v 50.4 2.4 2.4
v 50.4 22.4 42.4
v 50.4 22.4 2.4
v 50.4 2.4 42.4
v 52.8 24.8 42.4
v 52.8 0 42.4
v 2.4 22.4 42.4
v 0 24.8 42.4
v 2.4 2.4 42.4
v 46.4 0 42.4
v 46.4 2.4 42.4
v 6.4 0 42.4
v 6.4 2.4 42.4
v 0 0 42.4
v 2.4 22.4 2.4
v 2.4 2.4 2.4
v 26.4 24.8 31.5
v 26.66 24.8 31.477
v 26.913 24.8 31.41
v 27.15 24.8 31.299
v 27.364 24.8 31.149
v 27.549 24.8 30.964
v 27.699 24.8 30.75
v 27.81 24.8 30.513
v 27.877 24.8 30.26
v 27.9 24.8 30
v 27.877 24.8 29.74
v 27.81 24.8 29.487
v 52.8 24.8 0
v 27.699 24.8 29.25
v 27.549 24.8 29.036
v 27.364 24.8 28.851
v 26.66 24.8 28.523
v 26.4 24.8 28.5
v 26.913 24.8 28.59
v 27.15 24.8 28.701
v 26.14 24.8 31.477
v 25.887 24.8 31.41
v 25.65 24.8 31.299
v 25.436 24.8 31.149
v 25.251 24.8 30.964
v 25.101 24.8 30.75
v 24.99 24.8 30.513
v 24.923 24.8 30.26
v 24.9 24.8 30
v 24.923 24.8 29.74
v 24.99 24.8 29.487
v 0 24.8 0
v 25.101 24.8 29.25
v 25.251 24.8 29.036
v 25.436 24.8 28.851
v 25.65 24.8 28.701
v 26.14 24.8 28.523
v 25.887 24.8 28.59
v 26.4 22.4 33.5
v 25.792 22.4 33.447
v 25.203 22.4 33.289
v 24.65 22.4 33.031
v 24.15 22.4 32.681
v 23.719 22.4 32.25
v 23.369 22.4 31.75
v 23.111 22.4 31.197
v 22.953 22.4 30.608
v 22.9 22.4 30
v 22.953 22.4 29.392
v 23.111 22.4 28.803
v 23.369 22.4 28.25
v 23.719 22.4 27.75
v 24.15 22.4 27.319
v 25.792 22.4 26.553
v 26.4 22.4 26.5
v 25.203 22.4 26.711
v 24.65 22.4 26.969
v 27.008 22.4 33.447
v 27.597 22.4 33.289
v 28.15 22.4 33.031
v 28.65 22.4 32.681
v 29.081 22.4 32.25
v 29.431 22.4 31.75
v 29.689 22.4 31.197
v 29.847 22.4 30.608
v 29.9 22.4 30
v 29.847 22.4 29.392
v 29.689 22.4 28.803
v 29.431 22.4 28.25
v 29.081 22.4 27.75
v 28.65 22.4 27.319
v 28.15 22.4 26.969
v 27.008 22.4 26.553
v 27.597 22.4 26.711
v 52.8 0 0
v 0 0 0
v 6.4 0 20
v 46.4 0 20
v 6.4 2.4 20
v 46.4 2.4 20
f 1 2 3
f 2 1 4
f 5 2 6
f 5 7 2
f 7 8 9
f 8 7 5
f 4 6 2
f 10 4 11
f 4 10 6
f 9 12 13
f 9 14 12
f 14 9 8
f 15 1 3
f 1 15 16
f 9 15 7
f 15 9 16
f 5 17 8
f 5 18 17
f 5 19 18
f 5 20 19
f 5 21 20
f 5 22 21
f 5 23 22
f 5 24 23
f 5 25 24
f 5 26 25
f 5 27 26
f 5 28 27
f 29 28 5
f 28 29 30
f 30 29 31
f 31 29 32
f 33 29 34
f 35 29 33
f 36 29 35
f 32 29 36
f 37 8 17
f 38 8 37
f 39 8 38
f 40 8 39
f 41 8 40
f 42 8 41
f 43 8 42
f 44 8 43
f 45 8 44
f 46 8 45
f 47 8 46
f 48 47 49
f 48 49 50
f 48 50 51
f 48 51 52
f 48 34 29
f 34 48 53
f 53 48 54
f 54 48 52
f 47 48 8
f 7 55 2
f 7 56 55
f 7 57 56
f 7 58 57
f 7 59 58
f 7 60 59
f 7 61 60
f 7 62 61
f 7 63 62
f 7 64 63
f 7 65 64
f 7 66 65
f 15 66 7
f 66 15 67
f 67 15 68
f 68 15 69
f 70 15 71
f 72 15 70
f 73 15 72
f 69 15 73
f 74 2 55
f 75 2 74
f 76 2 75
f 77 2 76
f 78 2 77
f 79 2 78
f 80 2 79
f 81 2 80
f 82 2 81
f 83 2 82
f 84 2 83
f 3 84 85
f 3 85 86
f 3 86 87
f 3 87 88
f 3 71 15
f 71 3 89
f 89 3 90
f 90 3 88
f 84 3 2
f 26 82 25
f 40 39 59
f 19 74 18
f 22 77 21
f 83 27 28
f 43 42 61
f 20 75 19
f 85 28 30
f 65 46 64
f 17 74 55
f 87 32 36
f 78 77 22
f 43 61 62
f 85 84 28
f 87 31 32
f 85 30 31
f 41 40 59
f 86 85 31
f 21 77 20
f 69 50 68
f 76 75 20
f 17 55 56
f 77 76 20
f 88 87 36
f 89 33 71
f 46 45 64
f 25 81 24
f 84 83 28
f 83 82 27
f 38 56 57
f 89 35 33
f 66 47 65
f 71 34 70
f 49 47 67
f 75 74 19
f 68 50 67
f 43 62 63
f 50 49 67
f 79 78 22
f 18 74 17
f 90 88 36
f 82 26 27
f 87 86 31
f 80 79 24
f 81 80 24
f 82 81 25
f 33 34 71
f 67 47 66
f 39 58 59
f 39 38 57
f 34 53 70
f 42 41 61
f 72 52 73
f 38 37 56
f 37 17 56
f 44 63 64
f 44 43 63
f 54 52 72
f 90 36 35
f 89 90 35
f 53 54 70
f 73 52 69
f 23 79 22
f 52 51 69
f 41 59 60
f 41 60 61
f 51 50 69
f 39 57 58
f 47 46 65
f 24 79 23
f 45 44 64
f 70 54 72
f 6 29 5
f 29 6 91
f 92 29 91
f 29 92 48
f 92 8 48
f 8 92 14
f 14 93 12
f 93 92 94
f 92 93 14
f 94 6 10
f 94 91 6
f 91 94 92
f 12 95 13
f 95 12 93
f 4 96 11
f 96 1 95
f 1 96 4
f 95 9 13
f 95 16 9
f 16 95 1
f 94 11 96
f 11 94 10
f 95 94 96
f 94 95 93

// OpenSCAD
//x10
$fn=36;
h=40;//80 height until end of battery holder, but we only use the half
th=h+106;//total height of remote
w=48;//47 breit, mit Toleranz
d=20;//depth without keys 19, with keys 22 => 20 mit Toleranz
lb=4;//left border until keys
bb=20;//bottom border until keys
t=2.4;

//bottom plate
cube([2*t+w,2*t+d,t]);

//Left side
translate([0,0,t])
cube([t,2*t+d,h]);

//Right side
translate([t+w,0,t])
cube([t,2*t+d,h]);


//Front left
translate([t, 0, t])
cube([lb,t,h]);

//Front right
translate([w-lb+t, 0, t])
cube([lb,t,h]);

//Front bottom
cube([w,t,bb]);

module screwhole($t,$dg,$dk)
{
    color("gold")
    rotate([90,0,0])
    cylinder(h=$t,d1=$dk,d2=$dg);
}

difference()
{
//Back
translate([t, d+t, t])
cube([w,t,h]);

translate([(w+t+t)/2,t+d+t,bb+(h-bb)/2])
screwhole(t,7,3);
}
